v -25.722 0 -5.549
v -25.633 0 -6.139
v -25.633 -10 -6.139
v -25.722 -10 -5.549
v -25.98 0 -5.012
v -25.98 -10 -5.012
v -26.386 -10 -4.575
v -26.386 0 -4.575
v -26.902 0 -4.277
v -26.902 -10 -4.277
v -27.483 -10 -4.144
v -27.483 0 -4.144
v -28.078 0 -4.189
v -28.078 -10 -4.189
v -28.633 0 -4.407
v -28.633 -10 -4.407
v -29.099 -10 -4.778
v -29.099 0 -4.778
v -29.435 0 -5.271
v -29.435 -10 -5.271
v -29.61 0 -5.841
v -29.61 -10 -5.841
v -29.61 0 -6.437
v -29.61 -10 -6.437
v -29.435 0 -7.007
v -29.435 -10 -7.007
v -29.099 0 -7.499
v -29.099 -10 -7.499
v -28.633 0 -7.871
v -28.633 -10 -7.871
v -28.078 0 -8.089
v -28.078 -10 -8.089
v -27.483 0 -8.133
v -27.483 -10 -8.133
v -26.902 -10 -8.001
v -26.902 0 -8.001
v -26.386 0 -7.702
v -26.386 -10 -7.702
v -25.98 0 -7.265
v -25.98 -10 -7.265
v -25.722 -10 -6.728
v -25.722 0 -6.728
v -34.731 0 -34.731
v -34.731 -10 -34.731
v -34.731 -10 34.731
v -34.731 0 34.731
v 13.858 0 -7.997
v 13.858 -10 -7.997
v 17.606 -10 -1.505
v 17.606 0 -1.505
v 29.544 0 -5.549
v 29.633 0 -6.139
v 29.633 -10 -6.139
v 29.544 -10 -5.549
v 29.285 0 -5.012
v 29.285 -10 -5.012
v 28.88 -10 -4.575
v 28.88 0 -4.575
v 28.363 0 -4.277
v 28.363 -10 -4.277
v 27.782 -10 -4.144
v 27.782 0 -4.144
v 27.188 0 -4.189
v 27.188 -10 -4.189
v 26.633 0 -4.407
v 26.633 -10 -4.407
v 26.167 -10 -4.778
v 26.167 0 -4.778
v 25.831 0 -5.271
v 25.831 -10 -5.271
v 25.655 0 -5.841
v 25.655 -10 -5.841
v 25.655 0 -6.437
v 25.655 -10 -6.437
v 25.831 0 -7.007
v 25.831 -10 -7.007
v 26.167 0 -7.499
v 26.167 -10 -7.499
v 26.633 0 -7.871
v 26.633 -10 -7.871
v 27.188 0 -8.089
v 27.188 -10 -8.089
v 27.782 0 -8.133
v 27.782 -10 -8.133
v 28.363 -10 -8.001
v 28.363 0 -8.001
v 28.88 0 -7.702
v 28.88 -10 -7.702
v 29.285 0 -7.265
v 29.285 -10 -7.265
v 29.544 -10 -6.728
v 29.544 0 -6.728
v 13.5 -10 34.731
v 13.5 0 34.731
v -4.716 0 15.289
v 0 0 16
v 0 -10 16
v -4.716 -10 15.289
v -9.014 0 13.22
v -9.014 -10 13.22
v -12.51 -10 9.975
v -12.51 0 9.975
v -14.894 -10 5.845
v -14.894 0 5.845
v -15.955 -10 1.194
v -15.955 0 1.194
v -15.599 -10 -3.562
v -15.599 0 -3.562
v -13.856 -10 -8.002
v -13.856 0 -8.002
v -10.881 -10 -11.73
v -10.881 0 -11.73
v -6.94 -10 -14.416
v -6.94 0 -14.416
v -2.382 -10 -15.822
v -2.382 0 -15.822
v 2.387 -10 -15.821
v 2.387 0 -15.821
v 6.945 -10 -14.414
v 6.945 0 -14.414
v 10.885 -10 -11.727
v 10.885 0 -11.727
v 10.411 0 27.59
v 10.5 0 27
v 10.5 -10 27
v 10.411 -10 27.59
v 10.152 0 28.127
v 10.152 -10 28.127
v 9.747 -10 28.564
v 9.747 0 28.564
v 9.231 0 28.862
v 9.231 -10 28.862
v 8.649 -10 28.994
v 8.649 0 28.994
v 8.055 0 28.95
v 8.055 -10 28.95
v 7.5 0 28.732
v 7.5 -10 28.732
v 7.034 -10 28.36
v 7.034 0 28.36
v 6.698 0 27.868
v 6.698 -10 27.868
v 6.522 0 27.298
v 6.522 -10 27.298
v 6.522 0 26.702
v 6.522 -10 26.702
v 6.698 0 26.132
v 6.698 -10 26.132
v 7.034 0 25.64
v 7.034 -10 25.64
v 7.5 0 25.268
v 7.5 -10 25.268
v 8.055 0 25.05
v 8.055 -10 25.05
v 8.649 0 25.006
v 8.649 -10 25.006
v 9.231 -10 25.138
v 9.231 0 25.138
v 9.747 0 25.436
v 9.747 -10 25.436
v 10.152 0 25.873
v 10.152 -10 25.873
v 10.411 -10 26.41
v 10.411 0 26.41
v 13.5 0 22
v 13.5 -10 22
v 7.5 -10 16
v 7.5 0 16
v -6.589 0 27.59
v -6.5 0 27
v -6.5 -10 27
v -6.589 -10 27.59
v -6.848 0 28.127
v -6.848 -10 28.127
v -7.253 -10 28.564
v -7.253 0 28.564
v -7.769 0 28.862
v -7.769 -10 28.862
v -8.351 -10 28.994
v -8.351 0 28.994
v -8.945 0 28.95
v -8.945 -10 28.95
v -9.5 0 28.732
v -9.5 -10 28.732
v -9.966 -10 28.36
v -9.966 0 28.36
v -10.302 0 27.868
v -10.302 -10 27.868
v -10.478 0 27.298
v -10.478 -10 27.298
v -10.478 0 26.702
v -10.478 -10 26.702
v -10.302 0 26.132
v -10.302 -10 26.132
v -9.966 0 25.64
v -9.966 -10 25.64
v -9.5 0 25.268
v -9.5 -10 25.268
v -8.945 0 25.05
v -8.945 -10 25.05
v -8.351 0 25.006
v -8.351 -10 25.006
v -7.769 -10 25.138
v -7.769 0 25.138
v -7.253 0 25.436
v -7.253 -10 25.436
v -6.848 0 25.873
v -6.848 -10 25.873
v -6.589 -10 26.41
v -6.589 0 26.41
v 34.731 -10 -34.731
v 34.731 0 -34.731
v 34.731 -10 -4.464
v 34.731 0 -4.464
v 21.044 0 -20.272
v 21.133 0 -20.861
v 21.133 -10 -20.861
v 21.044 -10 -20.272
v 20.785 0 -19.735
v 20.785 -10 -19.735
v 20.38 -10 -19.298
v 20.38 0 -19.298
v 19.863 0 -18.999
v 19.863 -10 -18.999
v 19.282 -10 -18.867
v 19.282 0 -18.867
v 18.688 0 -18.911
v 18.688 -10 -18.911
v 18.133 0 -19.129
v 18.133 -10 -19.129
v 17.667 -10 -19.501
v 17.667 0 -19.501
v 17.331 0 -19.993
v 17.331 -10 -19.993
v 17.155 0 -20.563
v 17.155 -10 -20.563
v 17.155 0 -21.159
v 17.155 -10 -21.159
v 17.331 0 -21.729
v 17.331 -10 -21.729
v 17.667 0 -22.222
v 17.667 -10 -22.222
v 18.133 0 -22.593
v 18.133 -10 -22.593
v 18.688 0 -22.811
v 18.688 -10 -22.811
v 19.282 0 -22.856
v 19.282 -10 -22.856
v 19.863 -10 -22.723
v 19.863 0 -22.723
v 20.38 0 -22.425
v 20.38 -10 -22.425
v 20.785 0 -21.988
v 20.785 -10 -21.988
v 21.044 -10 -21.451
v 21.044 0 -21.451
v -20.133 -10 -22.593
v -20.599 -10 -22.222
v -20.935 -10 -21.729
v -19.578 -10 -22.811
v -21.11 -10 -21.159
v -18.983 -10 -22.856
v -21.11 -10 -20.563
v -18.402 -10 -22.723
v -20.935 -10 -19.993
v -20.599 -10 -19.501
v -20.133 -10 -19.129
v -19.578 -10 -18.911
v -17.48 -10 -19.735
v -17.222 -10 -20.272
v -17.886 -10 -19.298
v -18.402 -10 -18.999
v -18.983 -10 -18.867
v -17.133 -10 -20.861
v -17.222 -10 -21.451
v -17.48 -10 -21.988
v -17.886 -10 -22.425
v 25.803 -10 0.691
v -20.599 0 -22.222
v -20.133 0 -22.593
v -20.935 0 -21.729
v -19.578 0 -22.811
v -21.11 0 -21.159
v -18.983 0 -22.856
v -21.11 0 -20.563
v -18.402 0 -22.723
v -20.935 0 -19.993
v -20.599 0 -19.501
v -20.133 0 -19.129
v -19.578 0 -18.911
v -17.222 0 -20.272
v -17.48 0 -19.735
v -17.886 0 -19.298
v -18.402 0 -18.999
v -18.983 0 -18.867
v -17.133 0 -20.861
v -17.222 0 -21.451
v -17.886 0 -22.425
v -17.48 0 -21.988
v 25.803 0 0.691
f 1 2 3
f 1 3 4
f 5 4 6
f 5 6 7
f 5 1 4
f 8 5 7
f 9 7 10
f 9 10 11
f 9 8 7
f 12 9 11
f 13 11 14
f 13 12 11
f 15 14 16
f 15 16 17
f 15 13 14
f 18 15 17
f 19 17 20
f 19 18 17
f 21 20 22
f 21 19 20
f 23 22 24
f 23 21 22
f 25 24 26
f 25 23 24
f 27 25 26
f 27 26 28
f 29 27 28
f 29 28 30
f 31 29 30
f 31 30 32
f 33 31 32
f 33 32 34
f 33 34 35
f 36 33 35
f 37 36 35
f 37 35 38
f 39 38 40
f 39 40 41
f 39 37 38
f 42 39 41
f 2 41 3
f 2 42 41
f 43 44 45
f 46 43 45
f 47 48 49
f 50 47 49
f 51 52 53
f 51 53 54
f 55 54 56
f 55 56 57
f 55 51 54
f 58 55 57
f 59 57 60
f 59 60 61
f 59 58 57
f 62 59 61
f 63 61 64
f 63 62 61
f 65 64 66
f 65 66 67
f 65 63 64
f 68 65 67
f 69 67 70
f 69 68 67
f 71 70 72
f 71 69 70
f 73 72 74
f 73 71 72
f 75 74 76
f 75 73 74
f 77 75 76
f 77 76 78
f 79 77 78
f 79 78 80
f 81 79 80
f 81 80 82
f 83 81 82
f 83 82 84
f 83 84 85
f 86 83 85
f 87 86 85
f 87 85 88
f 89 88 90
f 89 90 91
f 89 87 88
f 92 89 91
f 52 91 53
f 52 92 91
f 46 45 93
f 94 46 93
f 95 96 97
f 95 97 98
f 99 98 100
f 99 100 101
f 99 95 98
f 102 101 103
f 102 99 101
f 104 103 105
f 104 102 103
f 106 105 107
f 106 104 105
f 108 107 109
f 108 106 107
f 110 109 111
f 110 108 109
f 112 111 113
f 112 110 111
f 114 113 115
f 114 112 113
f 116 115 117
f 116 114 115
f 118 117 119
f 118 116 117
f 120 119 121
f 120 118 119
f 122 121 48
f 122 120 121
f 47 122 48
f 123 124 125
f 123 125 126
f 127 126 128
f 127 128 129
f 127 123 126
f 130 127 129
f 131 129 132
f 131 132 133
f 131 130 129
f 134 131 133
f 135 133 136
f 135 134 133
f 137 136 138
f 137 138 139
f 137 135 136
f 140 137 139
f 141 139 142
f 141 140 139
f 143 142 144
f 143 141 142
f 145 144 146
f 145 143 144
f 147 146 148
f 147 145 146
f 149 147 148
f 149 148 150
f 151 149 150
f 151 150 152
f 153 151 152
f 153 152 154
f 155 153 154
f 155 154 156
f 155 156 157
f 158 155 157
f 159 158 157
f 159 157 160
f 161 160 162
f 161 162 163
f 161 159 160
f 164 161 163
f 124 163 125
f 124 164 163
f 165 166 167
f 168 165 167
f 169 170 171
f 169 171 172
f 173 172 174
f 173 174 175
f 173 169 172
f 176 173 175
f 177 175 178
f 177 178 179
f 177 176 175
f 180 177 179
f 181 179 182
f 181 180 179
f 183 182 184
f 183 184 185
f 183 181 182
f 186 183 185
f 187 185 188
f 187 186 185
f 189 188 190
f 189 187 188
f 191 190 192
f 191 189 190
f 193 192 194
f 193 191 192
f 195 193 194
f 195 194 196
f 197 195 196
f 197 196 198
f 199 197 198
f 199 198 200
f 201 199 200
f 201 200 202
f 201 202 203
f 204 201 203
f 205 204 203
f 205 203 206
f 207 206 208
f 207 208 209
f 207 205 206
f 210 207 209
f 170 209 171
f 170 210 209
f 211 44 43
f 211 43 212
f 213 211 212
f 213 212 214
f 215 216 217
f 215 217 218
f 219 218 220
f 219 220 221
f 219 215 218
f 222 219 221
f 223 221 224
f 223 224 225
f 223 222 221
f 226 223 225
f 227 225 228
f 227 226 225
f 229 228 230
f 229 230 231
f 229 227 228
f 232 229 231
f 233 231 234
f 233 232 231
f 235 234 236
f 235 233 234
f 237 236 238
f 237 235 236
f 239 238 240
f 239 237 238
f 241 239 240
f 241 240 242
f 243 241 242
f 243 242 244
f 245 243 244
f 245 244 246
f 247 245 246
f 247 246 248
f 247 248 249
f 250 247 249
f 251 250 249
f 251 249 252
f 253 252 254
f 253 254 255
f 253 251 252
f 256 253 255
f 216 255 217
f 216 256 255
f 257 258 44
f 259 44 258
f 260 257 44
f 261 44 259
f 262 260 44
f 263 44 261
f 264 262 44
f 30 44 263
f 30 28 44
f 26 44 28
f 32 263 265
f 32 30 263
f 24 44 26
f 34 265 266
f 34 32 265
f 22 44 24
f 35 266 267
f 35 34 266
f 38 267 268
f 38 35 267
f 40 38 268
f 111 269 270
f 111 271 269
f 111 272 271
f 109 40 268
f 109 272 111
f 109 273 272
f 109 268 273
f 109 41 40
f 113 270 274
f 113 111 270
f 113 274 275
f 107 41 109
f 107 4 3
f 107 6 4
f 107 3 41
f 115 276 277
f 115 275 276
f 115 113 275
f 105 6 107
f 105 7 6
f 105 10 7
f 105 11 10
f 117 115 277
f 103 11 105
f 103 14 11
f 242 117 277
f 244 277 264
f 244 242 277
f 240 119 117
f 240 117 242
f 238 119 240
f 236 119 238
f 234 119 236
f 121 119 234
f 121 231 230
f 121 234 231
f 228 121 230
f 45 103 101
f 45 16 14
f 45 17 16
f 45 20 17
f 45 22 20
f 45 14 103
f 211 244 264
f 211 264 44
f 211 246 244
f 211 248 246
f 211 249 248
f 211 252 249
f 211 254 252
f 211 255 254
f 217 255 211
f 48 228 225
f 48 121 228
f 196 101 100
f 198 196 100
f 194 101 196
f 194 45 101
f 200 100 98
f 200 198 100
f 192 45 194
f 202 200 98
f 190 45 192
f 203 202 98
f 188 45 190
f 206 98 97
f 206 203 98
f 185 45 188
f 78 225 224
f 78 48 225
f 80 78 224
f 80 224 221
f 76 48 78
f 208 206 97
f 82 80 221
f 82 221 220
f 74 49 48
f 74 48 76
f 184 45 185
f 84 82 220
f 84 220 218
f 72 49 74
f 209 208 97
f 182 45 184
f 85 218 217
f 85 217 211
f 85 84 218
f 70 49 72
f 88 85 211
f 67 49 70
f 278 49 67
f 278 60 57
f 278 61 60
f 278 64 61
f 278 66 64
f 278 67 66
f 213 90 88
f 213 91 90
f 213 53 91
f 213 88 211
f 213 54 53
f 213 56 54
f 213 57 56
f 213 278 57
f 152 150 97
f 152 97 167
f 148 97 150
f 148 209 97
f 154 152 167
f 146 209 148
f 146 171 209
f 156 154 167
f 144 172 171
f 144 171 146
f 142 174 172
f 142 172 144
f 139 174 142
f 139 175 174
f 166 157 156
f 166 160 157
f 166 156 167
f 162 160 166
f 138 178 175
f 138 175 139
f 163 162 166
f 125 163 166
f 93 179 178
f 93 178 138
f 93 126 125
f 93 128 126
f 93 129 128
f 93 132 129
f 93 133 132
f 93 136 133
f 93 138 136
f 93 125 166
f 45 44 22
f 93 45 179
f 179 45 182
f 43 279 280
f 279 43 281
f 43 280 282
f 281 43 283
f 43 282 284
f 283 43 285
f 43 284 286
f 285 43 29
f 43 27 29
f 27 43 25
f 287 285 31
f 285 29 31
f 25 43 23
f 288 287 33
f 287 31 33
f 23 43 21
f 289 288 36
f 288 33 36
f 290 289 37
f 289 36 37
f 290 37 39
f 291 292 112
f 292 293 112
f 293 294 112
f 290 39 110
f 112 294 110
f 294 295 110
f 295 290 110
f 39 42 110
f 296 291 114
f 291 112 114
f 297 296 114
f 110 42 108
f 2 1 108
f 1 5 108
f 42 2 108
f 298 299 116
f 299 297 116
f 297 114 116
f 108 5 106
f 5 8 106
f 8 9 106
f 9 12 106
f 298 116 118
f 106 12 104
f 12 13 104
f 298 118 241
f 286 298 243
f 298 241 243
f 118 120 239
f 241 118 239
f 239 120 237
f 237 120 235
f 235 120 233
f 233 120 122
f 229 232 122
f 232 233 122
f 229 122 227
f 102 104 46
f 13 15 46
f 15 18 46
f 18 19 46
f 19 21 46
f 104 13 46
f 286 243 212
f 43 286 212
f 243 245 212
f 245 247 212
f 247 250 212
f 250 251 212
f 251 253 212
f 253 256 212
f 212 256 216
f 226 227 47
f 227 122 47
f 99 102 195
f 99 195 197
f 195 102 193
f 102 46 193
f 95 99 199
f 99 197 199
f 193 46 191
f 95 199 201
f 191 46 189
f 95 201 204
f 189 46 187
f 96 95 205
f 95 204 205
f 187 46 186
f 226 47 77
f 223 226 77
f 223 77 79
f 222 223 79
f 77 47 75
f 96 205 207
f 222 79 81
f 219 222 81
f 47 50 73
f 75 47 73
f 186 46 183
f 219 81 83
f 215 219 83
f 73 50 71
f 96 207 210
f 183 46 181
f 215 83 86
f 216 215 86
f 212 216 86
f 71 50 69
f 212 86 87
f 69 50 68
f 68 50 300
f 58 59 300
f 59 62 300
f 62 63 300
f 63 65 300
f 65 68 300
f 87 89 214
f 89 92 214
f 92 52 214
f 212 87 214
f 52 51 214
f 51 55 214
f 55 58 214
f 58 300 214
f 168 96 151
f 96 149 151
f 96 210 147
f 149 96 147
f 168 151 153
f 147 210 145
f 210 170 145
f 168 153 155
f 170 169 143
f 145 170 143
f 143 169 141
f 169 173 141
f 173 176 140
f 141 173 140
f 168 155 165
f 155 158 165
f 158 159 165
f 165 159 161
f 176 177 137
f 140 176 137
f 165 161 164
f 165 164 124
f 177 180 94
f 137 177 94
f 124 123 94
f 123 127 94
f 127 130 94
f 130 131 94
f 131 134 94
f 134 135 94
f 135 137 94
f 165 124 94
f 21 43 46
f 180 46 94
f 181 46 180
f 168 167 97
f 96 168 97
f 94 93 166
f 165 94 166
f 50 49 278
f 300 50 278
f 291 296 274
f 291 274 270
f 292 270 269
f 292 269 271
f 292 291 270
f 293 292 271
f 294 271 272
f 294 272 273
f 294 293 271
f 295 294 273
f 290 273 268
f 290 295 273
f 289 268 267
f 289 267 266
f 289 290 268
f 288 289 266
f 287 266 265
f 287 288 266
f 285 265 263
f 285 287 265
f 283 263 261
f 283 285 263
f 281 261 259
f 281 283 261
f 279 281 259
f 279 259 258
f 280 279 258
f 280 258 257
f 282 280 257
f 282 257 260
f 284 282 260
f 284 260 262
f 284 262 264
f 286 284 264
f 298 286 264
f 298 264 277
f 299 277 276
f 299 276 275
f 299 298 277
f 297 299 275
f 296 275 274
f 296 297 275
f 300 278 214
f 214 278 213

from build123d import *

# Parameters (mm, degrees)
F0_W     = 80
F0_H     = 80
F0_R     = 2
F0_R_2   = 16
F1_DEPTH = 10
F2_W     = 80
F2_H     = 80
F2_W_2   = 69.46222
F2_H_2   = 69.46222
F3_DEPTH = 25
F5_DEPTH = 25


with BuildPart() as f1:
    # F0 (on Front) → F1 (new body)
    with BuildSketch(Plane.XZ):
        Rectangle(F0_W, F0_H)
        with Locations((-19.132686, -20.861216)):
            Circle(F0_R, mode=Mode.SUBTRACT)
        with Locations((-27.632686, -6.138784)):
            Circle(F0_R, mode=Mode.SUBTRACT)
        with Locations((19.132686, -20.861216)):
            Circle(F0_R, mode=Mode.SUBTRACT)
        with Locations((27.632686, -6.138784)):
            Circle(F0_R, mode=Mode.SUBTRACT)
        with Locations((-8.5, 27)):
            Circle(F0_R, mode=Mode.SUBTRACT)
        Circle(F0_R_2, mode=Mode.SUBTRACT)
        with Locations((8.5, 27)):
            Circle(F0_R, mode=Mode.SUBTRACT)
    extrude(amount=F1_DEPTH)

    # F2 (on face) → F3 (cut)
    with BuildSketch(Plane.XZ.offset(10)):
        Rectangle(F2_W, F2_H)
        Rectangle(F2_W_2, F2_H_2, mode=Mode.SUBTRACT)
    extrude(amount=-F3_DEPTH, mode=Mode.SUBTRACT)

    # F4 (on face) → F5 (cut)
    with BuildSketch(Plane.XZ.offset(10)):
        Polygon((17.606406, -1.504809), (25.802559, 0.691343), (41.845802, -8.571228), (36.725588, 37.045255), (13.5, 34.73111), (13.5, 22), (7.5, 16), (0, 16), (13.856406, -8), align=None)
    extrude(amount=-F5_DEPTH, mode=Mode.SUBTRACT)


solid = f1.part
